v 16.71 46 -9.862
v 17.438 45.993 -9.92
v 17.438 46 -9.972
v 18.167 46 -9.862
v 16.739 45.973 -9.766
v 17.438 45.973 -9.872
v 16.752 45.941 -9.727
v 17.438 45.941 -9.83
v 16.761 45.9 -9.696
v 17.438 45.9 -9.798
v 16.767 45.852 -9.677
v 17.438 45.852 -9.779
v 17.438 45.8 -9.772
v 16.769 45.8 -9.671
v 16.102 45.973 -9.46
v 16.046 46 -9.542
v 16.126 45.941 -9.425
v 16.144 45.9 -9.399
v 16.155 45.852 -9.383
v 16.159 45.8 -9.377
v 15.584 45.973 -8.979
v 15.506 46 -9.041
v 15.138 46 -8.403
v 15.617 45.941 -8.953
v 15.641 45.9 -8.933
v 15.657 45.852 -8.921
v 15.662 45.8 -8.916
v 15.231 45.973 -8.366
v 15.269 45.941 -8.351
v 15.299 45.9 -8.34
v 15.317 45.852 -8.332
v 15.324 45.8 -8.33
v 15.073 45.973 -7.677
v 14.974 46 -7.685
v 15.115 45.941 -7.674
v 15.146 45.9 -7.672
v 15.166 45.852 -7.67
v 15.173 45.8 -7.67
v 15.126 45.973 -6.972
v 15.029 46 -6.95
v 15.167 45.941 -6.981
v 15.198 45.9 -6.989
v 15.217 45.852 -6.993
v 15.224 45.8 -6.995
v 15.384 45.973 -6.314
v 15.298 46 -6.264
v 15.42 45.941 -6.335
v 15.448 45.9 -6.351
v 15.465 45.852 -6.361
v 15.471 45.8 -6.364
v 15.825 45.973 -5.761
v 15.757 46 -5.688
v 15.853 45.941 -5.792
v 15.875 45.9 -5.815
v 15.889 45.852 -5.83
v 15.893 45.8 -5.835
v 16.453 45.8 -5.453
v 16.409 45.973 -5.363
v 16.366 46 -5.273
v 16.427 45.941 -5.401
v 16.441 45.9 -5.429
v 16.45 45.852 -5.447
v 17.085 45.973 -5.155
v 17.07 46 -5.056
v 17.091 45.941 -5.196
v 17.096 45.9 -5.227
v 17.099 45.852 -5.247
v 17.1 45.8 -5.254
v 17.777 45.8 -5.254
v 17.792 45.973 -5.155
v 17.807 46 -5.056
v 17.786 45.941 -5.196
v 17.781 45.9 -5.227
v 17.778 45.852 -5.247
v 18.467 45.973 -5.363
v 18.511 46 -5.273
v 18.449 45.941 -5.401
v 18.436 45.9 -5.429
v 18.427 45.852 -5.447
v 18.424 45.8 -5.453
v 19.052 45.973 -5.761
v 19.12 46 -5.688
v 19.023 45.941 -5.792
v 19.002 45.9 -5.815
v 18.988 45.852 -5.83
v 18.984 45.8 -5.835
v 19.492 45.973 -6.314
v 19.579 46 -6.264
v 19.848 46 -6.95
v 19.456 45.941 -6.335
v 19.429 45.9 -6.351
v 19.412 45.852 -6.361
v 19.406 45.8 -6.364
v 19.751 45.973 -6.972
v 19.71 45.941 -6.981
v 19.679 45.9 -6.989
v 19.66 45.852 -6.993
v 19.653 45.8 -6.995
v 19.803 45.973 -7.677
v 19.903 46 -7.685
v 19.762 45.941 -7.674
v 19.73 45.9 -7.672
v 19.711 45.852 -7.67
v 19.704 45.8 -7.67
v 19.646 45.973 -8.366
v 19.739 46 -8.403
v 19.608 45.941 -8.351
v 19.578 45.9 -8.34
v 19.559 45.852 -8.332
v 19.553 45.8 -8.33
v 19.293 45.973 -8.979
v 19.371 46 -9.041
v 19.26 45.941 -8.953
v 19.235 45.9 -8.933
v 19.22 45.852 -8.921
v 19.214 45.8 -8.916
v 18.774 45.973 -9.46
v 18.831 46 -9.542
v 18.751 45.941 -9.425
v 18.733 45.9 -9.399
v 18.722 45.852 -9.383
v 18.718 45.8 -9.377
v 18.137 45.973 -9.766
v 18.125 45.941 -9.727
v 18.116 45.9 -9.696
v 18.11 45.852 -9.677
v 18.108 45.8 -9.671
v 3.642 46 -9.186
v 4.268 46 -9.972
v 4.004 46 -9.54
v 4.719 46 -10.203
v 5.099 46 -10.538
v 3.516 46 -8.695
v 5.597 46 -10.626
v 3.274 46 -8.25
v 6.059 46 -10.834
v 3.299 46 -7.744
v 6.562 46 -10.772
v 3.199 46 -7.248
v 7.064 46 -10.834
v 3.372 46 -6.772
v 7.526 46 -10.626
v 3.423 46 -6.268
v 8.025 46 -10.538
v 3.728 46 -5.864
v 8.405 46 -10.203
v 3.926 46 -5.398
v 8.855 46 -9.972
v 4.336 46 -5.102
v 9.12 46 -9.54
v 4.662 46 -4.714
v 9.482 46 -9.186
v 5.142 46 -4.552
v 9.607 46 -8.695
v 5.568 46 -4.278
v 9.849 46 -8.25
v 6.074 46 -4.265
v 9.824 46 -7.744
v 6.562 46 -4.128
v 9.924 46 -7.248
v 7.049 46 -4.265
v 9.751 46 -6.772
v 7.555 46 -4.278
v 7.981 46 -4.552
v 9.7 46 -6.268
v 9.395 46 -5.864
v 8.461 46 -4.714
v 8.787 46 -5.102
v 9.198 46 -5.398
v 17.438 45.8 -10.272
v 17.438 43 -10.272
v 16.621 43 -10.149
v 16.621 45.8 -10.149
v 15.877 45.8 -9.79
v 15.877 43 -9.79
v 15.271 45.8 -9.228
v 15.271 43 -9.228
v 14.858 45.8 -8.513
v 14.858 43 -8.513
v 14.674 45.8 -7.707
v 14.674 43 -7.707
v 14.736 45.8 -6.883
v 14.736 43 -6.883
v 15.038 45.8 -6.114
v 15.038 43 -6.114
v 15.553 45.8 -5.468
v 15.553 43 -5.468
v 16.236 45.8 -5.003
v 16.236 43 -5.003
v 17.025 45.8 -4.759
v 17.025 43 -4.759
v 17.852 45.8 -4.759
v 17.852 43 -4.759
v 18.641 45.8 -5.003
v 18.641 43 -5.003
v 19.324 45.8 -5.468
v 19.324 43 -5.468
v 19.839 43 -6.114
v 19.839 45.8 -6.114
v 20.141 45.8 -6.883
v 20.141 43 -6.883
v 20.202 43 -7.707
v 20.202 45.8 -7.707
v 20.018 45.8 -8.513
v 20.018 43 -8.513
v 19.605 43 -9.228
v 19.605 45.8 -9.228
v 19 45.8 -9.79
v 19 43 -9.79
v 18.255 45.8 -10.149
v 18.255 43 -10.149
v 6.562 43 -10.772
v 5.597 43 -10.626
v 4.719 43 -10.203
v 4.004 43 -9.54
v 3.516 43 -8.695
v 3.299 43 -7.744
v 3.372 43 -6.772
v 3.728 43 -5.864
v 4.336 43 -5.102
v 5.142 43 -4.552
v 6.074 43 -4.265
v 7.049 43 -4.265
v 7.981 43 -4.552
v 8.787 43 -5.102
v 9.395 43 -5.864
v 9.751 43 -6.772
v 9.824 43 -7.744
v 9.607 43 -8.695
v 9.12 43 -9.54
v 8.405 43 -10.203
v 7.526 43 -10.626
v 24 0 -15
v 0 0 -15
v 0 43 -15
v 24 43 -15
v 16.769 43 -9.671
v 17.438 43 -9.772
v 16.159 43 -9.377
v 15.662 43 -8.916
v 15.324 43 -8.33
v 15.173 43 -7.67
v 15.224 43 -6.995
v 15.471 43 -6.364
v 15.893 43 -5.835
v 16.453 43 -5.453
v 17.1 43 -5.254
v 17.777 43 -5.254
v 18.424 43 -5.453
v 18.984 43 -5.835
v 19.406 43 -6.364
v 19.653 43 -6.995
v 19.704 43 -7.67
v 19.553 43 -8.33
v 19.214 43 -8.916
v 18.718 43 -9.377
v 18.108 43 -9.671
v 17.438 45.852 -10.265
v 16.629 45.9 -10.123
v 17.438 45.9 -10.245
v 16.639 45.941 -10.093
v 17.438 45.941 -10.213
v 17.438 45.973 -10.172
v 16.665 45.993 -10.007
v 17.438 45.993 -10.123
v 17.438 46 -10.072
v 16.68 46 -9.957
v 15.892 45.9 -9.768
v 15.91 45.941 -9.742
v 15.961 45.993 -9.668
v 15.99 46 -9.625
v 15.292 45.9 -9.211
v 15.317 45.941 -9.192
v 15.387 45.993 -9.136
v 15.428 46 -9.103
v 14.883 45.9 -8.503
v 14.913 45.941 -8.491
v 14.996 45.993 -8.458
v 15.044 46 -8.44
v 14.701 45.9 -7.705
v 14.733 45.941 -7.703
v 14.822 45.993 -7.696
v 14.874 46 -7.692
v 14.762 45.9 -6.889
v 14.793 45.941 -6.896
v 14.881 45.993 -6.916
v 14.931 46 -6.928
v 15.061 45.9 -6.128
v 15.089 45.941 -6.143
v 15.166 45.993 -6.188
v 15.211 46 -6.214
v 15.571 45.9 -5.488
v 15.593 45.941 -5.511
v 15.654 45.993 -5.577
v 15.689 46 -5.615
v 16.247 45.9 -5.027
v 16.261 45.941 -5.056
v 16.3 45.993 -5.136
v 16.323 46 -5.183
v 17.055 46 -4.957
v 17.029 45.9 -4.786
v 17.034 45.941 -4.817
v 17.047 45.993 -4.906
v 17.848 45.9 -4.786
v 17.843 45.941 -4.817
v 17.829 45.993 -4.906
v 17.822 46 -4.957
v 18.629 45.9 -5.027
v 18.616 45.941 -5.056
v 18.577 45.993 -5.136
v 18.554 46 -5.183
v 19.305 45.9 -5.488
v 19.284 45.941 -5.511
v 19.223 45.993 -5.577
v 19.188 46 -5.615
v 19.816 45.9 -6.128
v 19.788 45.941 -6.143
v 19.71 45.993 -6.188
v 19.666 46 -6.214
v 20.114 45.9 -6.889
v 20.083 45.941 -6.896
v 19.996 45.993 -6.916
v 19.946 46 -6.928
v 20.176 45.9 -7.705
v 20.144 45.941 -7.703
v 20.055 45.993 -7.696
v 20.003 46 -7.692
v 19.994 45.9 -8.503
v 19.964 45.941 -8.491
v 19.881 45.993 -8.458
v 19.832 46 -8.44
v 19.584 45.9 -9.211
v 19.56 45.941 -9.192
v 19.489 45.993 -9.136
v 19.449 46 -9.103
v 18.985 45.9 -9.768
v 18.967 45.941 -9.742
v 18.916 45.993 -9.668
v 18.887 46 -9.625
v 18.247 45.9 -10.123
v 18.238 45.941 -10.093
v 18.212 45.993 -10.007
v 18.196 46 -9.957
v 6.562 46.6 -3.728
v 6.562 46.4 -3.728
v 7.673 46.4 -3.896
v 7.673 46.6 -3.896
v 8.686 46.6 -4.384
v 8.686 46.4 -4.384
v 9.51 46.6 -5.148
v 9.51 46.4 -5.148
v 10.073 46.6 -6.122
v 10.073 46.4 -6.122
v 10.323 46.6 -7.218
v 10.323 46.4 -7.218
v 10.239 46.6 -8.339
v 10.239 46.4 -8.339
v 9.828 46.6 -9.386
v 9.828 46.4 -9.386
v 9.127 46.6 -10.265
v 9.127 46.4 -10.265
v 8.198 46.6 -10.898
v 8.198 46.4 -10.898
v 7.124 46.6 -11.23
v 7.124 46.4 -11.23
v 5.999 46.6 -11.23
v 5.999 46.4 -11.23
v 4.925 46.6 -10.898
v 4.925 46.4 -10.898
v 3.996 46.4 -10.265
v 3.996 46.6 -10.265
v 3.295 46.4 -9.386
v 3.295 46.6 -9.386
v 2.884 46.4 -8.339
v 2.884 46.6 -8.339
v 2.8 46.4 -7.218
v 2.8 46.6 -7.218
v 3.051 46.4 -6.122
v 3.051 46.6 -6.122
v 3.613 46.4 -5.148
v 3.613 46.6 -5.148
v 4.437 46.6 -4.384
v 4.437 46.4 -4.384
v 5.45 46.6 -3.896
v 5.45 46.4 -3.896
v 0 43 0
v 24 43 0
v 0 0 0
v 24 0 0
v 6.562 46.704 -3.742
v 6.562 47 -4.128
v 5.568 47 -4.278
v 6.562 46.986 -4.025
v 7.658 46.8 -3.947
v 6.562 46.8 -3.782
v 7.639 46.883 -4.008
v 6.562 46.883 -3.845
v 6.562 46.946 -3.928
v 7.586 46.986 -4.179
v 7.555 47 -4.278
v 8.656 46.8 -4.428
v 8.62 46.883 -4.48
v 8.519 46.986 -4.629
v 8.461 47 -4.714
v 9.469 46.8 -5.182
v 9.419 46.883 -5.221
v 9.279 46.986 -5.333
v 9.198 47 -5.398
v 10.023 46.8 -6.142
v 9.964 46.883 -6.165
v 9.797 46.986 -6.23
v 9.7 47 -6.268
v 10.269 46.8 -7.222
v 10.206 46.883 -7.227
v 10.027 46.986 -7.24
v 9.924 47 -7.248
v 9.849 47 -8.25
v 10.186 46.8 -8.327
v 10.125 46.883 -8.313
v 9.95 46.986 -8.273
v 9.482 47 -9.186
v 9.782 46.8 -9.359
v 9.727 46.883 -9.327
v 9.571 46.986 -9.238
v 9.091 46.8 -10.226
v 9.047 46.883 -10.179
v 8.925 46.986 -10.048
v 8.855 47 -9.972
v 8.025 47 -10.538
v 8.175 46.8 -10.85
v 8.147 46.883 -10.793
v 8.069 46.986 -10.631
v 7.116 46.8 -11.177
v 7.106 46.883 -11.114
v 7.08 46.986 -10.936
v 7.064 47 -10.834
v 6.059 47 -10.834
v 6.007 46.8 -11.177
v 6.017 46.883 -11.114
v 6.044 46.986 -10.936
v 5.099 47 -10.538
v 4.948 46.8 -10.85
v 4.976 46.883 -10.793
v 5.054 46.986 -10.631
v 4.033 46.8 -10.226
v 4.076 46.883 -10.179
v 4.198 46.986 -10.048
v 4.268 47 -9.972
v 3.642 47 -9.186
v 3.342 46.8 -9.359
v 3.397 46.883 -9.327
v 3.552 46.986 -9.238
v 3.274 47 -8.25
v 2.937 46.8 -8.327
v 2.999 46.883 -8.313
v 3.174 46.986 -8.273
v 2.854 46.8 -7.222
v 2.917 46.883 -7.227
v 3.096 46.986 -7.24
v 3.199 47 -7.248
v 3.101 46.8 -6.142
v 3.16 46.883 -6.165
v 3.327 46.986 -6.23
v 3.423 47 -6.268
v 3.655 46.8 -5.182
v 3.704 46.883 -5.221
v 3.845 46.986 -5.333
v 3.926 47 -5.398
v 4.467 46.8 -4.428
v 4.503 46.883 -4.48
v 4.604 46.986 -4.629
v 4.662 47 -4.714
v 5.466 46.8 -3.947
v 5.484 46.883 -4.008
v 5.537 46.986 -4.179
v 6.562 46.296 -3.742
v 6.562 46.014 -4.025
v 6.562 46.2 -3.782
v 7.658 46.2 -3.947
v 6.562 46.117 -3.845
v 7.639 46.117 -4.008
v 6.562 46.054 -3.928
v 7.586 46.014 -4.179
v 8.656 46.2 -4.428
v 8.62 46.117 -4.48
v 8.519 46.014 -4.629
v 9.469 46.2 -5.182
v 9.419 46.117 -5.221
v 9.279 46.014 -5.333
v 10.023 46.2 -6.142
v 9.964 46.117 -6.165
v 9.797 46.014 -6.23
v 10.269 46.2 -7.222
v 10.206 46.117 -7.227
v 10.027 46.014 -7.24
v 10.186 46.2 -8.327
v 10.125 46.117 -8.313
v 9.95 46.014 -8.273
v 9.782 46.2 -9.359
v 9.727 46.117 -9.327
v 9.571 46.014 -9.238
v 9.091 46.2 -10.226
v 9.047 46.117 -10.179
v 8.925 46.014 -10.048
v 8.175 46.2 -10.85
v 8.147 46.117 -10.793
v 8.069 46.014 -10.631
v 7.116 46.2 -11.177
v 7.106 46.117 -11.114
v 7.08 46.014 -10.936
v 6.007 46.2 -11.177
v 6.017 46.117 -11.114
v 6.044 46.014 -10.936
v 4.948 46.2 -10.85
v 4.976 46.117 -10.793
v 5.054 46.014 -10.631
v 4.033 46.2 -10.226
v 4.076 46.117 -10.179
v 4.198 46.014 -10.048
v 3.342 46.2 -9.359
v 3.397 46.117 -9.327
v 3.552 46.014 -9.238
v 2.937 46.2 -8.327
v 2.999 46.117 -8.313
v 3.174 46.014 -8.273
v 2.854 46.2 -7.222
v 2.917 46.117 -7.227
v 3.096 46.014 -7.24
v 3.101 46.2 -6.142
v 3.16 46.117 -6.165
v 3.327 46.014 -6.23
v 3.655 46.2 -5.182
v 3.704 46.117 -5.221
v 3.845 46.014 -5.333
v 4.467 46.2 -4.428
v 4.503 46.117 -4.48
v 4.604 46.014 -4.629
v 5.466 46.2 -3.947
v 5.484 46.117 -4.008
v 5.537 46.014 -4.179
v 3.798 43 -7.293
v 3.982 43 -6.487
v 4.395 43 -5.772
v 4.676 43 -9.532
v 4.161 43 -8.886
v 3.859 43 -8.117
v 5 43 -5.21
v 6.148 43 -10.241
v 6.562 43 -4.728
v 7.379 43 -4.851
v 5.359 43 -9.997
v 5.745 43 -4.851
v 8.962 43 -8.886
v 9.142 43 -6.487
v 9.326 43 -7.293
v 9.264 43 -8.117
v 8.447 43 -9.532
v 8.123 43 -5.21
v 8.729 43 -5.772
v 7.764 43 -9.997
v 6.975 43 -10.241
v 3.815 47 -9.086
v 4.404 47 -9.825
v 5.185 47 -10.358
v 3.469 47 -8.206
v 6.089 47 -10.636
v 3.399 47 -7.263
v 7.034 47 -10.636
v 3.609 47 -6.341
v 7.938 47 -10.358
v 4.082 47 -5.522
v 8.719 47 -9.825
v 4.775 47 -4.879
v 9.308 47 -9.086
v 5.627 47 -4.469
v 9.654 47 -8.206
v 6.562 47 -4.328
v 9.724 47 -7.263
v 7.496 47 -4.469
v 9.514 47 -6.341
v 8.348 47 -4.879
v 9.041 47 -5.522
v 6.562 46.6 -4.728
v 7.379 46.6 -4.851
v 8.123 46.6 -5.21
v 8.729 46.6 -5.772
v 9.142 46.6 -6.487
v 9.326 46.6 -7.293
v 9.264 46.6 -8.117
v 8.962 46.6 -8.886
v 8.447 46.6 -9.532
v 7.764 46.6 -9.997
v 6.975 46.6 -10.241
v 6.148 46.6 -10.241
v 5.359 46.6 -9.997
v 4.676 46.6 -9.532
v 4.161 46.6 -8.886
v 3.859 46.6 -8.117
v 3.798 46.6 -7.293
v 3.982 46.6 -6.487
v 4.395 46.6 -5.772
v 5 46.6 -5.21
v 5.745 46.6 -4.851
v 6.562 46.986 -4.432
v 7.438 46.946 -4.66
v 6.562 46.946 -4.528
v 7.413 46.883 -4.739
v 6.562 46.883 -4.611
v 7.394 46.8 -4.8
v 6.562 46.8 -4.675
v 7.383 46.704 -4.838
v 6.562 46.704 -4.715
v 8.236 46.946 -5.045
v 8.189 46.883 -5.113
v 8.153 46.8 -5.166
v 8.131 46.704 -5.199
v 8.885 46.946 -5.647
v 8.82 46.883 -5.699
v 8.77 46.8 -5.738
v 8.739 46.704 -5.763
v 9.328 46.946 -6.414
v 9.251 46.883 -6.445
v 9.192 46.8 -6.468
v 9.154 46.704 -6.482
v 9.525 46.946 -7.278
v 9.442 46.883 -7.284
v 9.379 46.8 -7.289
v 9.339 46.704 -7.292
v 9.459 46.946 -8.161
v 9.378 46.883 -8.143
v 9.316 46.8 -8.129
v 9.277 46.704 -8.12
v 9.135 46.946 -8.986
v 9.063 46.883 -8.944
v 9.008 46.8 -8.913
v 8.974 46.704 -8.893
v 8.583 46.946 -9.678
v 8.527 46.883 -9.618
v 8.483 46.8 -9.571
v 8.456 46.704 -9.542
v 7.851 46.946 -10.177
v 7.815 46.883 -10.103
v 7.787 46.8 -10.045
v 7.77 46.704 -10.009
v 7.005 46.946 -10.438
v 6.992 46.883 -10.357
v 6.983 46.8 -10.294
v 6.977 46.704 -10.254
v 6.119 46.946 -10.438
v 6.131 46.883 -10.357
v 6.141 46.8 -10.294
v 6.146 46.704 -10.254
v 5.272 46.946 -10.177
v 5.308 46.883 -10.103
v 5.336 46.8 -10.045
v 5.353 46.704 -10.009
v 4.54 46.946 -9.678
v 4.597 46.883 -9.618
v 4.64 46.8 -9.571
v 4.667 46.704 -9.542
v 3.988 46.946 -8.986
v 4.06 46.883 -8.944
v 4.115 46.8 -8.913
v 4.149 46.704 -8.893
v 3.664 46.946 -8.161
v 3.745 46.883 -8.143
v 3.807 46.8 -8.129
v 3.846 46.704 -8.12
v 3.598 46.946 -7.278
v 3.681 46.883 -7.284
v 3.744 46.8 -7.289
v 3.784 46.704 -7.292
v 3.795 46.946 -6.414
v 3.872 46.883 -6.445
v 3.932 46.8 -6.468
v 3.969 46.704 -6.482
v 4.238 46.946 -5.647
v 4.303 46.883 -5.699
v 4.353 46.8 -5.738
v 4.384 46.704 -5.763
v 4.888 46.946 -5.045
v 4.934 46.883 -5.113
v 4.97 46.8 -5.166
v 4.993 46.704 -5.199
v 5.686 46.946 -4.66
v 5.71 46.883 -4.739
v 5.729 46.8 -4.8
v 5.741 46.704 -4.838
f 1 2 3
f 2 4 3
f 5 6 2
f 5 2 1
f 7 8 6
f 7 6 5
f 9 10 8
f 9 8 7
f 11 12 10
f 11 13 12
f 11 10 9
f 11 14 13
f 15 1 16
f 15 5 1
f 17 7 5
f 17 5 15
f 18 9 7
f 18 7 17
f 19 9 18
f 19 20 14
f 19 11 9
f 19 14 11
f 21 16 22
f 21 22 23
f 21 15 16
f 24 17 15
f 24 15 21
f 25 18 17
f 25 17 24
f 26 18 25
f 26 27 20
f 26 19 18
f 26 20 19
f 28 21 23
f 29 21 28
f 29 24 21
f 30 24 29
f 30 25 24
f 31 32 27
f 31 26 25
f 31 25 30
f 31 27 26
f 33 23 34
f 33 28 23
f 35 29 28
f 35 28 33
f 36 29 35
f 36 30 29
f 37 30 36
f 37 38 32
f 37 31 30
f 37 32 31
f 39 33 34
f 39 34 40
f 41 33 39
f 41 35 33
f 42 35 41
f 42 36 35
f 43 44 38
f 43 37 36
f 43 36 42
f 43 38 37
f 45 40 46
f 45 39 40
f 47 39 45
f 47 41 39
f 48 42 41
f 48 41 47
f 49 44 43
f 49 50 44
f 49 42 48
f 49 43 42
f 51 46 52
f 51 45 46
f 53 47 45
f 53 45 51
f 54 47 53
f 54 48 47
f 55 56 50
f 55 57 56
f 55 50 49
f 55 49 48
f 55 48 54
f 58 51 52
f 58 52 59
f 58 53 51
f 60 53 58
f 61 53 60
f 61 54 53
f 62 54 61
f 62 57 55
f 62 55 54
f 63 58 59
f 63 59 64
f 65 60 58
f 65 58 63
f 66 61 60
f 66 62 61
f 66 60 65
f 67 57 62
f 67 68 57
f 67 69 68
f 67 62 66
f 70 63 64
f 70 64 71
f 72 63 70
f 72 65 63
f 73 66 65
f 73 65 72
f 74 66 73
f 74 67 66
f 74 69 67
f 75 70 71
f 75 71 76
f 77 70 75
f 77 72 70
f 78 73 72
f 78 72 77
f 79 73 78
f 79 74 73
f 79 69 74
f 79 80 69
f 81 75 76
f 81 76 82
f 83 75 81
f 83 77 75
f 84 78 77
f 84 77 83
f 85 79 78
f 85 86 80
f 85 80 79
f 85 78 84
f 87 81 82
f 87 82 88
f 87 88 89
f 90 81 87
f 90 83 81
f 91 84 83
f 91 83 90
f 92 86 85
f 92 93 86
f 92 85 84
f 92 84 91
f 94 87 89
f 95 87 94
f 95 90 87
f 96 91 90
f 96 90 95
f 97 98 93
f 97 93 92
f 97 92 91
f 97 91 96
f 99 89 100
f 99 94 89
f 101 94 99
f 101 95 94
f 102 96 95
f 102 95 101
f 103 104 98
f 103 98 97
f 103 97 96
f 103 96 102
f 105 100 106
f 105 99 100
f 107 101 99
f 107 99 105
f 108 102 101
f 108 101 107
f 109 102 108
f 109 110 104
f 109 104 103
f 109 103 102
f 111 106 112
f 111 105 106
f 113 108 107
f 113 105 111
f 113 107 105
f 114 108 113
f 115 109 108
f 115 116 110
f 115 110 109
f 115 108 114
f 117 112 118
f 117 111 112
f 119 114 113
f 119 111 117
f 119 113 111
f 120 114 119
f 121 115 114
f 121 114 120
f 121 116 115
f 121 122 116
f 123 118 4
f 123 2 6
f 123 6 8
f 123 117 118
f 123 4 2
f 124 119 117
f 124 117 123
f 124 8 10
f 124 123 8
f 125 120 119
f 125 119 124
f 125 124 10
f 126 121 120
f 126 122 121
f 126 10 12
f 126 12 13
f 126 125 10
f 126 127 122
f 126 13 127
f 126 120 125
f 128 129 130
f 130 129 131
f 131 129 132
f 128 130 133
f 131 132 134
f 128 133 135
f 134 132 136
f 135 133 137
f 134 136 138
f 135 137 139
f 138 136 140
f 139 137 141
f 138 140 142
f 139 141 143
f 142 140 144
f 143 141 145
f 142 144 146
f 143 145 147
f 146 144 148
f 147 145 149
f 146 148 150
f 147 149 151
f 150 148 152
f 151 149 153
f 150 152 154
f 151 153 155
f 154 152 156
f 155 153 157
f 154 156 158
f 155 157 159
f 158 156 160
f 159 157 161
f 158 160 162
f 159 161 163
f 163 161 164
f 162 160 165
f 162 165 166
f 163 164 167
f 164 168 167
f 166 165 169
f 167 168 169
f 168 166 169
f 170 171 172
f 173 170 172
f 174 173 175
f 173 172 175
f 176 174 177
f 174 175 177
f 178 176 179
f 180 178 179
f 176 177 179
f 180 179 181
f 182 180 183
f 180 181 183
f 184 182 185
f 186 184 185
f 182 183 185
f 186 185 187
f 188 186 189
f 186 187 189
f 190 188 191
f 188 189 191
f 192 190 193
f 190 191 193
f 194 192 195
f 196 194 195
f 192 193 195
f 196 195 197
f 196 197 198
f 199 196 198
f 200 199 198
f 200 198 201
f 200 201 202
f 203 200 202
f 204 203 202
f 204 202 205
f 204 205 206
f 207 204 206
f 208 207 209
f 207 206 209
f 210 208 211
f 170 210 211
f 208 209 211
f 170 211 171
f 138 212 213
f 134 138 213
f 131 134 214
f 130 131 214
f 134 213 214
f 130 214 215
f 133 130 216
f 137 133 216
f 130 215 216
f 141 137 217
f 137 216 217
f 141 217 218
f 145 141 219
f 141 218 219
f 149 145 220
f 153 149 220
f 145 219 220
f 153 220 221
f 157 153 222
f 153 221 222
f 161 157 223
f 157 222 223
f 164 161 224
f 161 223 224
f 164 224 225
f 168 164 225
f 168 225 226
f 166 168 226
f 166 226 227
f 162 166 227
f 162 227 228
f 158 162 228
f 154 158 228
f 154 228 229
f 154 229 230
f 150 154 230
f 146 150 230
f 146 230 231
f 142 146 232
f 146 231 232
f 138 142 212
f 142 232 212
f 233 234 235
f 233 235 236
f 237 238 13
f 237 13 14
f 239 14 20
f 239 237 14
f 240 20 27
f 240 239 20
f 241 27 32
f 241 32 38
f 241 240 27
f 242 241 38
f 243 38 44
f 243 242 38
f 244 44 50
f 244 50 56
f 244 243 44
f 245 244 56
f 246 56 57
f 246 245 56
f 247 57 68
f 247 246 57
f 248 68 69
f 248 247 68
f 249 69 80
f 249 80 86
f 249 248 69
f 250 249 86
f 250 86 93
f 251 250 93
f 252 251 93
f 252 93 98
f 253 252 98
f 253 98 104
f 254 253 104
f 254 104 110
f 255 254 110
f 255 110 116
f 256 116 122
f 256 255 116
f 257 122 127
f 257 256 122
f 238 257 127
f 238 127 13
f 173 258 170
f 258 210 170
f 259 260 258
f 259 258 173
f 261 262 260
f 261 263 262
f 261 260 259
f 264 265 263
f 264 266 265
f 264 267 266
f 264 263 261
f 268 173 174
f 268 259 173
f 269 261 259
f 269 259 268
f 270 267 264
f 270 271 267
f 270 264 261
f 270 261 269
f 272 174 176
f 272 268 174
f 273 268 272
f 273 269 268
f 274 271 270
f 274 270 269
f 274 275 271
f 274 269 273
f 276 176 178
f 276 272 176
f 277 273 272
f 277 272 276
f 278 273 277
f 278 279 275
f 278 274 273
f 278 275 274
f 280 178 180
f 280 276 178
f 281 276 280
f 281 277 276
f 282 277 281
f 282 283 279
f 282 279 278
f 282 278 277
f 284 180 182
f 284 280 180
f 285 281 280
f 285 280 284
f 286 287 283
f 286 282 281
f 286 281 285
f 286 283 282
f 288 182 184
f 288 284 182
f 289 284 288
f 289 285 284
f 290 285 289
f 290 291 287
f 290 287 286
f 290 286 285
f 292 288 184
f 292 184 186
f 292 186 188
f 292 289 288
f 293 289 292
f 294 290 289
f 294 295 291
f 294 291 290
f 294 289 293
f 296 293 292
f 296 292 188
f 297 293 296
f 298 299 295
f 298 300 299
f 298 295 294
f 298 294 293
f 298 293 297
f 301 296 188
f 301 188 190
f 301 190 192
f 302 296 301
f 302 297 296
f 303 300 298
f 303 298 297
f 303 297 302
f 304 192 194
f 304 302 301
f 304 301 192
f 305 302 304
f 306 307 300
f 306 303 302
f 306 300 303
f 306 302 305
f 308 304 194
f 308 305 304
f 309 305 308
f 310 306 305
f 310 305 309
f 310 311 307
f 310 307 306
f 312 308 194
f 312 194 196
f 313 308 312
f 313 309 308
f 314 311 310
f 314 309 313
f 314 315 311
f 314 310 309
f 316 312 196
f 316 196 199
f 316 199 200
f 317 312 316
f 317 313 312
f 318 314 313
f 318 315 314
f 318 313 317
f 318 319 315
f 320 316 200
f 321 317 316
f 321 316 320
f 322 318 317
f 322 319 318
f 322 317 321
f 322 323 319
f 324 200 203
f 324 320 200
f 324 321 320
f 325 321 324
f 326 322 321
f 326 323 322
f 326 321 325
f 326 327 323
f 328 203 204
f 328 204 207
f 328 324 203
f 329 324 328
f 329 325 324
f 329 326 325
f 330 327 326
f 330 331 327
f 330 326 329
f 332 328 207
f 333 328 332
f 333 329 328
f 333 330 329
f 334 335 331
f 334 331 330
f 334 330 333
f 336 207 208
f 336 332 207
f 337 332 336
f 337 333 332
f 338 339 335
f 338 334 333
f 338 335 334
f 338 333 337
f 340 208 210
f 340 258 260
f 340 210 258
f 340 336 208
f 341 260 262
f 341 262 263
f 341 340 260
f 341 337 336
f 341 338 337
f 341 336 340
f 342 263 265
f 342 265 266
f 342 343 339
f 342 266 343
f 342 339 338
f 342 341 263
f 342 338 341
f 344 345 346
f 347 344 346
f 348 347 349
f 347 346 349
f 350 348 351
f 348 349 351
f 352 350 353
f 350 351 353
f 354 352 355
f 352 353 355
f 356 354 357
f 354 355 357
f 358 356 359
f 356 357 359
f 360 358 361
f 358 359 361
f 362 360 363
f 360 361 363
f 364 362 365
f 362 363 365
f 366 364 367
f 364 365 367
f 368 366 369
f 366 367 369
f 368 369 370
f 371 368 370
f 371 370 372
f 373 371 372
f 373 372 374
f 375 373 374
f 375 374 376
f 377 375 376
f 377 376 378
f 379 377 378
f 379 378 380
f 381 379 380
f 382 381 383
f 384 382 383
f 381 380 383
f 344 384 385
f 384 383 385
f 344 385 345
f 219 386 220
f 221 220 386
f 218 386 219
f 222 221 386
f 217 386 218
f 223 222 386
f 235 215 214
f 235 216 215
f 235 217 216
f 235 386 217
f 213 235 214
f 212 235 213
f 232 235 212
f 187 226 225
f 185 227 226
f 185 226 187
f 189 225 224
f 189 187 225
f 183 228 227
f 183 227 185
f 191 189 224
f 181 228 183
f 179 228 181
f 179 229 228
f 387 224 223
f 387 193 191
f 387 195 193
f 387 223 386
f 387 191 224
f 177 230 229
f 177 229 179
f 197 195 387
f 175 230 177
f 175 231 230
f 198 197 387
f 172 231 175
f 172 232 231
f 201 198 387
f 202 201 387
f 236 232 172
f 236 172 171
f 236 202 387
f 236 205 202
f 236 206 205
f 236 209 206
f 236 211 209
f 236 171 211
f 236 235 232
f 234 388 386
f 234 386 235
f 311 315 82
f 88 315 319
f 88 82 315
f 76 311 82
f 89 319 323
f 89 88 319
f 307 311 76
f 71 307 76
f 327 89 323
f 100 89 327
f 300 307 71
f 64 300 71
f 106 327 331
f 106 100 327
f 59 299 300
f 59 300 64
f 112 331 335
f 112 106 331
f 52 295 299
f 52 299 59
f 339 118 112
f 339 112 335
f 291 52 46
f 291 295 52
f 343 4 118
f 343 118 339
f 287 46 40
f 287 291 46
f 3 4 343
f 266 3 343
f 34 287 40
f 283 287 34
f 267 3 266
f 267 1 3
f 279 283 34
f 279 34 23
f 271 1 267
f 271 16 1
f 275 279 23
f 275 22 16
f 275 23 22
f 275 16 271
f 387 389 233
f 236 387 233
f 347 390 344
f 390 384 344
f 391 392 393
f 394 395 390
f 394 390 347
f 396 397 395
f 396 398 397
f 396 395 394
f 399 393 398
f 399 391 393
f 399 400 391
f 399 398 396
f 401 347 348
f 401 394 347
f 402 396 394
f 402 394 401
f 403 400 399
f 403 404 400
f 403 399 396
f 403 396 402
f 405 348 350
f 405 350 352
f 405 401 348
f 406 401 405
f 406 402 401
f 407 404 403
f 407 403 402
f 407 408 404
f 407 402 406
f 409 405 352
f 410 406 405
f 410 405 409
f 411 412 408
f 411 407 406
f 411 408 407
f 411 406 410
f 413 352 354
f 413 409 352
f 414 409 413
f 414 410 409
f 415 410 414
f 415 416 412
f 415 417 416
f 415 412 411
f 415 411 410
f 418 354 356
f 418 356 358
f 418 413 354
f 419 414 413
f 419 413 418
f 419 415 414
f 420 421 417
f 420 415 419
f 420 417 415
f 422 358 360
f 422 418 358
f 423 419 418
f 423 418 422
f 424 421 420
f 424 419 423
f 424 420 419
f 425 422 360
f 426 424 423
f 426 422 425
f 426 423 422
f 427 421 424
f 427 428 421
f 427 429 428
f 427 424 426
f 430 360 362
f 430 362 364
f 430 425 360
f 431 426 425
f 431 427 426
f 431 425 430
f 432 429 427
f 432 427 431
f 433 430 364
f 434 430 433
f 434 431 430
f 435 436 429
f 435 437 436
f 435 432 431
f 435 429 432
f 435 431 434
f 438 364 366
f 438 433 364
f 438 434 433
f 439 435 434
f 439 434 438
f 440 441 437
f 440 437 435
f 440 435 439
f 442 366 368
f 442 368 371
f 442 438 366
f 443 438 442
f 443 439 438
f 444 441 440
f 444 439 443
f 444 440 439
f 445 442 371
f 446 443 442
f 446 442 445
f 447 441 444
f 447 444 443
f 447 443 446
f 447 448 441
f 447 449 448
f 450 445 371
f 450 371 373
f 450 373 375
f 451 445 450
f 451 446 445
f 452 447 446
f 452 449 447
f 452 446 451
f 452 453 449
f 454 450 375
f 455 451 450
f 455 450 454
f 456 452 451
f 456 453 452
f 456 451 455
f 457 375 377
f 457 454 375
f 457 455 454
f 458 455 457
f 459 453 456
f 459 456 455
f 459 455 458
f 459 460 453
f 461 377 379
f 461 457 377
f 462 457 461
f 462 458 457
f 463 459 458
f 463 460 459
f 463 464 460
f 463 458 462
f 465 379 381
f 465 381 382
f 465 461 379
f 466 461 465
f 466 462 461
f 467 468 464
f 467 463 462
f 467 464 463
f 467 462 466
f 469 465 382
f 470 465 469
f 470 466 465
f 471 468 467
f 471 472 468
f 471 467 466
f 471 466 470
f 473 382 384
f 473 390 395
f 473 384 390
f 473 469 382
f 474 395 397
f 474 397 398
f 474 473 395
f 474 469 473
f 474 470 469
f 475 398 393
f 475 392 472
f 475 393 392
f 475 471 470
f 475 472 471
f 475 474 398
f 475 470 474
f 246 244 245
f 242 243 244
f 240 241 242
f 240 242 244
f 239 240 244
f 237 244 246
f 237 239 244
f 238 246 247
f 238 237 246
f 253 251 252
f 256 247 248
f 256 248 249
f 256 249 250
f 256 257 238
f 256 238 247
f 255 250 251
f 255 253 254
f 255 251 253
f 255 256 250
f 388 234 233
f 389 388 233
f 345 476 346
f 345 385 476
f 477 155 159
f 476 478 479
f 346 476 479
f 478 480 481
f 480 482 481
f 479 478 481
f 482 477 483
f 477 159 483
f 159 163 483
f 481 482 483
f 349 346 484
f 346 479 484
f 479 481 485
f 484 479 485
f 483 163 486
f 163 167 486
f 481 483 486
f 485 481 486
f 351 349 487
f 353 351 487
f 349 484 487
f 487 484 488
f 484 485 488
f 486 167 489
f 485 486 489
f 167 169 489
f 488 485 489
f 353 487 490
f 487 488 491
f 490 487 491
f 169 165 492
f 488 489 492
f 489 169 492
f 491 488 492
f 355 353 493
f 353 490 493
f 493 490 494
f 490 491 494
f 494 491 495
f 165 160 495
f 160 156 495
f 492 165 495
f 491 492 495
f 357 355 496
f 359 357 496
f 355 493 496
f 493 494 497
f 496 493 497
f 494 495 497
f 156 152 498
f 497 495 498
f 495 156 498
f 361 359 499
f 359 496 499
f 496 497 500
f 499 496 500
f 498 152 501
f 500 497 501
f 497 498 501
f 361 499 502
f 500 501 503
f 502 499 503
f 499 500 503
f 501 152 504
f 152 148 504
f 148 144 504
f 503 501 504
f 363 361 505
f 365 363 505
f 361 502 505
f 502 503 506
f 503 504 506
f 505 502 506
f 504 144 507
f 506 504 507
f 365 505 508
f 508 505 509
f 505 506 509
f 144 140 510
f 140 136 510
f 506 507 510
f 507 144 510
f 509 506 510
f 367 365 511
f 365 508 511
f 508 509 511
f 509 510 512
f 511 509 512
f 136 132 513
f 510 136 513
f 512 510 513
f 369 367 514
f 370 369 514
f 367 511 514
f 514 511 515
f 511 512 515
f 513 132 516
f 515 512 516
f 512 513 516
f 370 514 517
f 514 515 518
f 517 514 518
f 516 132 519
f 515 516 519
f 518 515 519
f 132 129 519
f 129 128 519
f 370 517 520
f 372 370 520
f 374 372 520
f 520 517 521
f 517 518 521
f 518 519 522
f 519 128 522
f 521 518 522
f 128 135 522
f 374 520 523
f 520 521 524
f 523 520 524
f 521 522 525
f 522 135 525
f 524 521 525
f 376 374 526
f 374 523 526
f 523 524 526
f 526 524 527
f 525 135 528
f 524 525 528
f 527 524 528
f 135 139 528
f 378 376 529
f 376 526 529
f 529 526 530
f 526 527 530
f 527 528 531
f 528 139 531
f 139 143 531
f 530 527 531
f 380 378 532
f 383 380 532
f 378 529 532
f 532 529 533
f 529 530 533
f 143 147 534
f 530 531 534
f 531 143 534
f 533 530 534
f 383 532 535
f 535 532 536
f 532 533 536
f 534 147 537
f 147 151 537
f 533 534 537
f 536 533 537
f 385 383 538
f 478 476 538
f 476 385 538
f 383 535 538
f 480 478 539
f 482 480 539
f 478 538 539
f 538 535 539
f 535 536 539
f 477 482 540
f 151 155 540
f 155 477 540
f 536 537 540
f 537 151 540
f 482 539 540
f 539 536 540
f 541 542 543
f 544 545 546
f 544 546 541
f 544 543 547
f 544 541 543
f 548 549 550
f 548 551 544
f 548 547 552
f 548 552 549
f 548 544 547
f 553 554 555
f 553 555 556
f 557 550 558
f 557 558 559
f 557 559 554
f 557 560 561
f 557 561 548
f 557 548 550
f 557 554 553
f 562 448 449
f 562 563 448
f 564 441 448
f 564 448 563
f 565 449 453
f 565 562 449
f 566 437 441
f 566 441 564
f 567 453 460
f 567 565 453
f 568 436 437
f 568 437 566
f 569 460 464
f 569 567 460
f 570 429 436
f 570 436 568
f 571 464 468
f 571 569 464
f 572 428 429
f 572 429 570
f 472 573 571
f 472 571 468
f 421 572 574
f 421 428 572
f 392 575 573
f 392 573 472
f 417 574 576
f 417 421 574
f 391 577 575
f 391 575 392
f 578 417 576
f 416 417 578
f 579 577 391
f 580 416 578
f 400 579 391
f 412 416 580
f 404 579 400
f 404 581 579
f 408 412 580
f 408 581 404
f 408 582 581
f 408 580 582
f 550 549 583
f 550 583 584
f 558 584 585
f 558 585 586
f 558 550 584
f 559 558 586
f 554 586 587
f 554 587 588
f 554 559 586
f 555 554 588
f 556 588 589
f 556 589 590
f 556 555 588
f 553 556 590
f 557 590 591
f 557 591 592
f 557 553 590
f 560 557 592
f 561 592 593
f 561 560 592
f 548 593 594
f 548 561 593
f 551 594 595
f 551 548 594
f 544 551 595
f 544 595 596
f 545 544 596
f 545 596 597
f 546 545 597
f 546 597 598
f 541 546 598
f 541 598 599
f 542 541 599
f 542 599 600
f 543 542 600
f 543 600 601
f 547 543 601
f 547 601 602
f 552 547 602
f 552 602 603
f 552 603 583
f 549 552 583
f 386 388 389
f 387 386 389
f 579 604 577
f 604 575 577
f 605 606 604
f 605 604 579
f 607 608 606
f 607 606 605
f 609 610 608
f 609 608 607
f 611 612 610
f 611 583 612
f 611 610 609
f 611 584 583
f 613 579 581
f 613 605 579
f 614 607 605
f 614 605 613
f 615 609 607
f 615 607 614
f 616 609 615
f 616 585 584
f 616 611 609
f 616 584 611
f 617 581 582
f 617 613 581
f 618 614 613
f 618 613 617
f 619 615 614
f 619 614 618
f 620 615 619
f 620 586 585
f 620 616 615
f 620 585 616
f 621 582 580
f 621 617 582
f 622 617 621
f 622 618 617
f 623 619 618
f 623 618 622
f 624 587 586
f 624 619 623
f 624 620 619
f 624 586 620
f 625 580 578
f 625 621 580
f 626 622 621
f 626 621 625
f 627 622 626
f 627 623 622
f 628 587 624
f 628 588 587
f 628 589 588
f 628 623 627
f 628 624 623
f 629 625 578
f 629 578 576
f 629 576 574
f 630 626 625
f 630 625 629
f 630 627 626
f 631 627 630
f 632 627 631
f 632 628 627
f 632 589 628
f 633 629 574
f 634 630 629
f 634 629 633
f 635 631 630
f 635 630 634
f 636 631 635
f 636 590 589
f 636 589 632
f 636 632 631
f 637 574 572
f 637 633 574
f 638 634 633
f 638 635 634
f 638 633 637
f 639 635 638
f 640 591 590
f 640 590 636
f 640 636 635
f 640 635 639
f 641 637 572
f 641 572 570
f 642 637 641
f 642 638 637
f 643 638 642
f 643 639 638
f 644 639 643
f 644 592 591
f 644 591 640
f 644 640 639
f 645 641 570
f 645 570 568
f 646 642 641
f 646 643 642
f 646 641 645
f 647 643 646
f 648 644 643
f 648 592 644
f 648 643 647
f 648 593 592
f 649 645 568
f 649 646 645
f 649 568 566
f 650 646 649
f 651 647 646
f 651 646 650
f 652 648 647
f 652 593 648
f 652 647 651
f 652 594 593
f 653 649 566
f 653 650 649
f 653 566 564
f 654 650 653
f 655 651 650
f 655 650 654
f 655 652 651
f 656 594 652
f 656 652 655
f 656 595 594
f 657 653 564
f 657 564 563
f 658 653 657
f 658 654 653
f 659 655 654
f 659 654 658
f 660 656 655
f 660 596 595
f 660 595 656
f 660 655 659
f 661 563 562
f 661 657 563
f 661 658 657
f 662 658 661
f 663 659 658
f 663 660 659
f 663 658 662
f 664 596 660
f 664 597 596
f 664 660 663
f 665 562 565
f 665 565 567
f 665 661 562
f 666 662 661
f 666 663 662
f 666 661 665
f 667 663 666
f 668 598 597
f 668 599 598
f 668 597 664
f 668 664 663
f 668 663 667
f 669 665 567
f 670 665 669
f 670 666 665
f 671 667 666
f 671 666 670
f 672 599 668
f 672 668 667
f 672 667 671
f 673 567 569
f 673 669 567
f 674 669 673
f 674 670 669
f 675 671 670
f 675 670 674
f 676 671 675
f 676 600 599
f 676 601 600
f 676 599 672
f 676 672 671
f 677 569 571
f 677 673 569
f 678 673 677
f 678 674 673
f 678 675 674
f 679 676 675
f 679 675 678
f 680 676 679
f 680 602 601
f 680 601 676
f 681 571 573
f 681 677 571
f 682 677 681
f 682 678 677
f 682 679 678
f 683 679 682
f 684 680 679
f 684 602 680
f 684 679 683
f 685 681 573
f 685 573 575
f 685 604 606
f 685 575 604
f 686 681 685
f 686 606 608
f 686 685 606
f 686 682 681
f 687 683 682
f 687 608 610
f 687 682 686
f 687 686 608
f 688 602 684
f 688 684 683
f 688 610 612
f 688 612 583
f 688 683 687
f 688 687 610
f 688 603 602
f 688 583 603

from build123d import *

# Parameters (mm, degrees)
CROQUIS1_W              = 24
CROQUIS1_H              = 15
SALIENTE_EXTRUIR1_DEPTH = 43
CROQUIS2_R              = 2.771687151
CROQUIS2_R_2            = 2.271687151
CROQUIS2_R_3            = 3.271687151
SALIENTE_EXTRUIR2_DEPTH = 3
CROQUIS3_R              = 3.771687151
CROQUIS3_R_2            = 2.771687151
SALIENTE_EXTRUIR3_DEPTH = 1
REDONDEO1_R             = 0.4
REDONDEO2_R             = 0.2


with BuildPart() as part:
    # Croquis1 → Saliente-Extruir1 (new body)
    with BuildSketch(Plane(origin=(0, 0, 0), x_dir=(1, 0, 0), z_dir=(0, 1, 0))):
        with Locations((12, 7.5)):
            Rectangle(CROQUIS1_W, CROQUIS1_H)
    extrude(amount=SALIENTE_EXTRUIR1_DEPTH)

    # Croquis2 → Saliente-Extruir2 (add)
    # profile 1 of 2: a face of its own
    with BuildSketch(Plane(origin=(0, 43, 0), x_dir=(1, 0, 0), z_dir=(0, 1, 0))):
        with Locations(Location((17.438401582, 7.5, 0), (0, 0, 90))):
            Circle(CROQUIS2_R)
        with Locations(Location((17.438401582, 7.5, 0), (0, 0, 90))):
            Circle(CROQUIS2_R_2, mode=Mode.SUBTRACT)
    # profile 2 of 2: a face of its own
    with BuildSketch(Plane(origin=(0, 43, 0), x_dir=(1, 0, 0), z_dir=(0, 1, 0))):
        with Locations(Location((6.561598418, 7.5, 0), (0, 0, 90))):
            Circle(CROQUIS2_R_3)
        with Locations(Location((6.561598418, 7.5, 0), (0, 0, 270))):
            Circle(CROQUIS2_R, mode=Mode.SUBTRACT)
    extrude(amount=SALIENTE_EXTRUIR2_DEPTH)

    # Croquis3 → Saliente-Extruir3 (add)
    with BuildSketch(Plane(origin=(0, 46, 0), x_dir=(1, 0, 0), z_dir=(0, 1, 0))):
        with Locations(Location((6.561598418, 7.5, 0), (0, 0, 270))):
            Circle(CROQUIS3_R)
        with Locations(Location((6.561598418, 7.5, 0), (0, 0, 270))):
            Circle(CROQUIS3_R_2, mode=Mode.SUBTRACT)
    extrude(amount=SALIENTE_EXTRUIR3_DEPTH)

    # Redondeo1
    redondeo1_edges = [part.edges().sort_by_distance(p)[0] for p in [
        (6.561598418, 47, -11.271687151),
        (6.561598418, 46, -11.271687151),
        (6.561598418, 47, -10.271687151),
    ]]
    fillet(redondeo1_edges, radius=REDONDEO1_R)

    # Redondeo2
    redondeo2_edges = [part.edges().sort_by_distance(p)[0] for p in [
        (17.438401582, 46, -4.728312849),
        (17.438401582, 46, -5.228312849),
    ]]
    fillet(redondeo2_edges, radius=REDONDEO2_R)


solid = part.part
